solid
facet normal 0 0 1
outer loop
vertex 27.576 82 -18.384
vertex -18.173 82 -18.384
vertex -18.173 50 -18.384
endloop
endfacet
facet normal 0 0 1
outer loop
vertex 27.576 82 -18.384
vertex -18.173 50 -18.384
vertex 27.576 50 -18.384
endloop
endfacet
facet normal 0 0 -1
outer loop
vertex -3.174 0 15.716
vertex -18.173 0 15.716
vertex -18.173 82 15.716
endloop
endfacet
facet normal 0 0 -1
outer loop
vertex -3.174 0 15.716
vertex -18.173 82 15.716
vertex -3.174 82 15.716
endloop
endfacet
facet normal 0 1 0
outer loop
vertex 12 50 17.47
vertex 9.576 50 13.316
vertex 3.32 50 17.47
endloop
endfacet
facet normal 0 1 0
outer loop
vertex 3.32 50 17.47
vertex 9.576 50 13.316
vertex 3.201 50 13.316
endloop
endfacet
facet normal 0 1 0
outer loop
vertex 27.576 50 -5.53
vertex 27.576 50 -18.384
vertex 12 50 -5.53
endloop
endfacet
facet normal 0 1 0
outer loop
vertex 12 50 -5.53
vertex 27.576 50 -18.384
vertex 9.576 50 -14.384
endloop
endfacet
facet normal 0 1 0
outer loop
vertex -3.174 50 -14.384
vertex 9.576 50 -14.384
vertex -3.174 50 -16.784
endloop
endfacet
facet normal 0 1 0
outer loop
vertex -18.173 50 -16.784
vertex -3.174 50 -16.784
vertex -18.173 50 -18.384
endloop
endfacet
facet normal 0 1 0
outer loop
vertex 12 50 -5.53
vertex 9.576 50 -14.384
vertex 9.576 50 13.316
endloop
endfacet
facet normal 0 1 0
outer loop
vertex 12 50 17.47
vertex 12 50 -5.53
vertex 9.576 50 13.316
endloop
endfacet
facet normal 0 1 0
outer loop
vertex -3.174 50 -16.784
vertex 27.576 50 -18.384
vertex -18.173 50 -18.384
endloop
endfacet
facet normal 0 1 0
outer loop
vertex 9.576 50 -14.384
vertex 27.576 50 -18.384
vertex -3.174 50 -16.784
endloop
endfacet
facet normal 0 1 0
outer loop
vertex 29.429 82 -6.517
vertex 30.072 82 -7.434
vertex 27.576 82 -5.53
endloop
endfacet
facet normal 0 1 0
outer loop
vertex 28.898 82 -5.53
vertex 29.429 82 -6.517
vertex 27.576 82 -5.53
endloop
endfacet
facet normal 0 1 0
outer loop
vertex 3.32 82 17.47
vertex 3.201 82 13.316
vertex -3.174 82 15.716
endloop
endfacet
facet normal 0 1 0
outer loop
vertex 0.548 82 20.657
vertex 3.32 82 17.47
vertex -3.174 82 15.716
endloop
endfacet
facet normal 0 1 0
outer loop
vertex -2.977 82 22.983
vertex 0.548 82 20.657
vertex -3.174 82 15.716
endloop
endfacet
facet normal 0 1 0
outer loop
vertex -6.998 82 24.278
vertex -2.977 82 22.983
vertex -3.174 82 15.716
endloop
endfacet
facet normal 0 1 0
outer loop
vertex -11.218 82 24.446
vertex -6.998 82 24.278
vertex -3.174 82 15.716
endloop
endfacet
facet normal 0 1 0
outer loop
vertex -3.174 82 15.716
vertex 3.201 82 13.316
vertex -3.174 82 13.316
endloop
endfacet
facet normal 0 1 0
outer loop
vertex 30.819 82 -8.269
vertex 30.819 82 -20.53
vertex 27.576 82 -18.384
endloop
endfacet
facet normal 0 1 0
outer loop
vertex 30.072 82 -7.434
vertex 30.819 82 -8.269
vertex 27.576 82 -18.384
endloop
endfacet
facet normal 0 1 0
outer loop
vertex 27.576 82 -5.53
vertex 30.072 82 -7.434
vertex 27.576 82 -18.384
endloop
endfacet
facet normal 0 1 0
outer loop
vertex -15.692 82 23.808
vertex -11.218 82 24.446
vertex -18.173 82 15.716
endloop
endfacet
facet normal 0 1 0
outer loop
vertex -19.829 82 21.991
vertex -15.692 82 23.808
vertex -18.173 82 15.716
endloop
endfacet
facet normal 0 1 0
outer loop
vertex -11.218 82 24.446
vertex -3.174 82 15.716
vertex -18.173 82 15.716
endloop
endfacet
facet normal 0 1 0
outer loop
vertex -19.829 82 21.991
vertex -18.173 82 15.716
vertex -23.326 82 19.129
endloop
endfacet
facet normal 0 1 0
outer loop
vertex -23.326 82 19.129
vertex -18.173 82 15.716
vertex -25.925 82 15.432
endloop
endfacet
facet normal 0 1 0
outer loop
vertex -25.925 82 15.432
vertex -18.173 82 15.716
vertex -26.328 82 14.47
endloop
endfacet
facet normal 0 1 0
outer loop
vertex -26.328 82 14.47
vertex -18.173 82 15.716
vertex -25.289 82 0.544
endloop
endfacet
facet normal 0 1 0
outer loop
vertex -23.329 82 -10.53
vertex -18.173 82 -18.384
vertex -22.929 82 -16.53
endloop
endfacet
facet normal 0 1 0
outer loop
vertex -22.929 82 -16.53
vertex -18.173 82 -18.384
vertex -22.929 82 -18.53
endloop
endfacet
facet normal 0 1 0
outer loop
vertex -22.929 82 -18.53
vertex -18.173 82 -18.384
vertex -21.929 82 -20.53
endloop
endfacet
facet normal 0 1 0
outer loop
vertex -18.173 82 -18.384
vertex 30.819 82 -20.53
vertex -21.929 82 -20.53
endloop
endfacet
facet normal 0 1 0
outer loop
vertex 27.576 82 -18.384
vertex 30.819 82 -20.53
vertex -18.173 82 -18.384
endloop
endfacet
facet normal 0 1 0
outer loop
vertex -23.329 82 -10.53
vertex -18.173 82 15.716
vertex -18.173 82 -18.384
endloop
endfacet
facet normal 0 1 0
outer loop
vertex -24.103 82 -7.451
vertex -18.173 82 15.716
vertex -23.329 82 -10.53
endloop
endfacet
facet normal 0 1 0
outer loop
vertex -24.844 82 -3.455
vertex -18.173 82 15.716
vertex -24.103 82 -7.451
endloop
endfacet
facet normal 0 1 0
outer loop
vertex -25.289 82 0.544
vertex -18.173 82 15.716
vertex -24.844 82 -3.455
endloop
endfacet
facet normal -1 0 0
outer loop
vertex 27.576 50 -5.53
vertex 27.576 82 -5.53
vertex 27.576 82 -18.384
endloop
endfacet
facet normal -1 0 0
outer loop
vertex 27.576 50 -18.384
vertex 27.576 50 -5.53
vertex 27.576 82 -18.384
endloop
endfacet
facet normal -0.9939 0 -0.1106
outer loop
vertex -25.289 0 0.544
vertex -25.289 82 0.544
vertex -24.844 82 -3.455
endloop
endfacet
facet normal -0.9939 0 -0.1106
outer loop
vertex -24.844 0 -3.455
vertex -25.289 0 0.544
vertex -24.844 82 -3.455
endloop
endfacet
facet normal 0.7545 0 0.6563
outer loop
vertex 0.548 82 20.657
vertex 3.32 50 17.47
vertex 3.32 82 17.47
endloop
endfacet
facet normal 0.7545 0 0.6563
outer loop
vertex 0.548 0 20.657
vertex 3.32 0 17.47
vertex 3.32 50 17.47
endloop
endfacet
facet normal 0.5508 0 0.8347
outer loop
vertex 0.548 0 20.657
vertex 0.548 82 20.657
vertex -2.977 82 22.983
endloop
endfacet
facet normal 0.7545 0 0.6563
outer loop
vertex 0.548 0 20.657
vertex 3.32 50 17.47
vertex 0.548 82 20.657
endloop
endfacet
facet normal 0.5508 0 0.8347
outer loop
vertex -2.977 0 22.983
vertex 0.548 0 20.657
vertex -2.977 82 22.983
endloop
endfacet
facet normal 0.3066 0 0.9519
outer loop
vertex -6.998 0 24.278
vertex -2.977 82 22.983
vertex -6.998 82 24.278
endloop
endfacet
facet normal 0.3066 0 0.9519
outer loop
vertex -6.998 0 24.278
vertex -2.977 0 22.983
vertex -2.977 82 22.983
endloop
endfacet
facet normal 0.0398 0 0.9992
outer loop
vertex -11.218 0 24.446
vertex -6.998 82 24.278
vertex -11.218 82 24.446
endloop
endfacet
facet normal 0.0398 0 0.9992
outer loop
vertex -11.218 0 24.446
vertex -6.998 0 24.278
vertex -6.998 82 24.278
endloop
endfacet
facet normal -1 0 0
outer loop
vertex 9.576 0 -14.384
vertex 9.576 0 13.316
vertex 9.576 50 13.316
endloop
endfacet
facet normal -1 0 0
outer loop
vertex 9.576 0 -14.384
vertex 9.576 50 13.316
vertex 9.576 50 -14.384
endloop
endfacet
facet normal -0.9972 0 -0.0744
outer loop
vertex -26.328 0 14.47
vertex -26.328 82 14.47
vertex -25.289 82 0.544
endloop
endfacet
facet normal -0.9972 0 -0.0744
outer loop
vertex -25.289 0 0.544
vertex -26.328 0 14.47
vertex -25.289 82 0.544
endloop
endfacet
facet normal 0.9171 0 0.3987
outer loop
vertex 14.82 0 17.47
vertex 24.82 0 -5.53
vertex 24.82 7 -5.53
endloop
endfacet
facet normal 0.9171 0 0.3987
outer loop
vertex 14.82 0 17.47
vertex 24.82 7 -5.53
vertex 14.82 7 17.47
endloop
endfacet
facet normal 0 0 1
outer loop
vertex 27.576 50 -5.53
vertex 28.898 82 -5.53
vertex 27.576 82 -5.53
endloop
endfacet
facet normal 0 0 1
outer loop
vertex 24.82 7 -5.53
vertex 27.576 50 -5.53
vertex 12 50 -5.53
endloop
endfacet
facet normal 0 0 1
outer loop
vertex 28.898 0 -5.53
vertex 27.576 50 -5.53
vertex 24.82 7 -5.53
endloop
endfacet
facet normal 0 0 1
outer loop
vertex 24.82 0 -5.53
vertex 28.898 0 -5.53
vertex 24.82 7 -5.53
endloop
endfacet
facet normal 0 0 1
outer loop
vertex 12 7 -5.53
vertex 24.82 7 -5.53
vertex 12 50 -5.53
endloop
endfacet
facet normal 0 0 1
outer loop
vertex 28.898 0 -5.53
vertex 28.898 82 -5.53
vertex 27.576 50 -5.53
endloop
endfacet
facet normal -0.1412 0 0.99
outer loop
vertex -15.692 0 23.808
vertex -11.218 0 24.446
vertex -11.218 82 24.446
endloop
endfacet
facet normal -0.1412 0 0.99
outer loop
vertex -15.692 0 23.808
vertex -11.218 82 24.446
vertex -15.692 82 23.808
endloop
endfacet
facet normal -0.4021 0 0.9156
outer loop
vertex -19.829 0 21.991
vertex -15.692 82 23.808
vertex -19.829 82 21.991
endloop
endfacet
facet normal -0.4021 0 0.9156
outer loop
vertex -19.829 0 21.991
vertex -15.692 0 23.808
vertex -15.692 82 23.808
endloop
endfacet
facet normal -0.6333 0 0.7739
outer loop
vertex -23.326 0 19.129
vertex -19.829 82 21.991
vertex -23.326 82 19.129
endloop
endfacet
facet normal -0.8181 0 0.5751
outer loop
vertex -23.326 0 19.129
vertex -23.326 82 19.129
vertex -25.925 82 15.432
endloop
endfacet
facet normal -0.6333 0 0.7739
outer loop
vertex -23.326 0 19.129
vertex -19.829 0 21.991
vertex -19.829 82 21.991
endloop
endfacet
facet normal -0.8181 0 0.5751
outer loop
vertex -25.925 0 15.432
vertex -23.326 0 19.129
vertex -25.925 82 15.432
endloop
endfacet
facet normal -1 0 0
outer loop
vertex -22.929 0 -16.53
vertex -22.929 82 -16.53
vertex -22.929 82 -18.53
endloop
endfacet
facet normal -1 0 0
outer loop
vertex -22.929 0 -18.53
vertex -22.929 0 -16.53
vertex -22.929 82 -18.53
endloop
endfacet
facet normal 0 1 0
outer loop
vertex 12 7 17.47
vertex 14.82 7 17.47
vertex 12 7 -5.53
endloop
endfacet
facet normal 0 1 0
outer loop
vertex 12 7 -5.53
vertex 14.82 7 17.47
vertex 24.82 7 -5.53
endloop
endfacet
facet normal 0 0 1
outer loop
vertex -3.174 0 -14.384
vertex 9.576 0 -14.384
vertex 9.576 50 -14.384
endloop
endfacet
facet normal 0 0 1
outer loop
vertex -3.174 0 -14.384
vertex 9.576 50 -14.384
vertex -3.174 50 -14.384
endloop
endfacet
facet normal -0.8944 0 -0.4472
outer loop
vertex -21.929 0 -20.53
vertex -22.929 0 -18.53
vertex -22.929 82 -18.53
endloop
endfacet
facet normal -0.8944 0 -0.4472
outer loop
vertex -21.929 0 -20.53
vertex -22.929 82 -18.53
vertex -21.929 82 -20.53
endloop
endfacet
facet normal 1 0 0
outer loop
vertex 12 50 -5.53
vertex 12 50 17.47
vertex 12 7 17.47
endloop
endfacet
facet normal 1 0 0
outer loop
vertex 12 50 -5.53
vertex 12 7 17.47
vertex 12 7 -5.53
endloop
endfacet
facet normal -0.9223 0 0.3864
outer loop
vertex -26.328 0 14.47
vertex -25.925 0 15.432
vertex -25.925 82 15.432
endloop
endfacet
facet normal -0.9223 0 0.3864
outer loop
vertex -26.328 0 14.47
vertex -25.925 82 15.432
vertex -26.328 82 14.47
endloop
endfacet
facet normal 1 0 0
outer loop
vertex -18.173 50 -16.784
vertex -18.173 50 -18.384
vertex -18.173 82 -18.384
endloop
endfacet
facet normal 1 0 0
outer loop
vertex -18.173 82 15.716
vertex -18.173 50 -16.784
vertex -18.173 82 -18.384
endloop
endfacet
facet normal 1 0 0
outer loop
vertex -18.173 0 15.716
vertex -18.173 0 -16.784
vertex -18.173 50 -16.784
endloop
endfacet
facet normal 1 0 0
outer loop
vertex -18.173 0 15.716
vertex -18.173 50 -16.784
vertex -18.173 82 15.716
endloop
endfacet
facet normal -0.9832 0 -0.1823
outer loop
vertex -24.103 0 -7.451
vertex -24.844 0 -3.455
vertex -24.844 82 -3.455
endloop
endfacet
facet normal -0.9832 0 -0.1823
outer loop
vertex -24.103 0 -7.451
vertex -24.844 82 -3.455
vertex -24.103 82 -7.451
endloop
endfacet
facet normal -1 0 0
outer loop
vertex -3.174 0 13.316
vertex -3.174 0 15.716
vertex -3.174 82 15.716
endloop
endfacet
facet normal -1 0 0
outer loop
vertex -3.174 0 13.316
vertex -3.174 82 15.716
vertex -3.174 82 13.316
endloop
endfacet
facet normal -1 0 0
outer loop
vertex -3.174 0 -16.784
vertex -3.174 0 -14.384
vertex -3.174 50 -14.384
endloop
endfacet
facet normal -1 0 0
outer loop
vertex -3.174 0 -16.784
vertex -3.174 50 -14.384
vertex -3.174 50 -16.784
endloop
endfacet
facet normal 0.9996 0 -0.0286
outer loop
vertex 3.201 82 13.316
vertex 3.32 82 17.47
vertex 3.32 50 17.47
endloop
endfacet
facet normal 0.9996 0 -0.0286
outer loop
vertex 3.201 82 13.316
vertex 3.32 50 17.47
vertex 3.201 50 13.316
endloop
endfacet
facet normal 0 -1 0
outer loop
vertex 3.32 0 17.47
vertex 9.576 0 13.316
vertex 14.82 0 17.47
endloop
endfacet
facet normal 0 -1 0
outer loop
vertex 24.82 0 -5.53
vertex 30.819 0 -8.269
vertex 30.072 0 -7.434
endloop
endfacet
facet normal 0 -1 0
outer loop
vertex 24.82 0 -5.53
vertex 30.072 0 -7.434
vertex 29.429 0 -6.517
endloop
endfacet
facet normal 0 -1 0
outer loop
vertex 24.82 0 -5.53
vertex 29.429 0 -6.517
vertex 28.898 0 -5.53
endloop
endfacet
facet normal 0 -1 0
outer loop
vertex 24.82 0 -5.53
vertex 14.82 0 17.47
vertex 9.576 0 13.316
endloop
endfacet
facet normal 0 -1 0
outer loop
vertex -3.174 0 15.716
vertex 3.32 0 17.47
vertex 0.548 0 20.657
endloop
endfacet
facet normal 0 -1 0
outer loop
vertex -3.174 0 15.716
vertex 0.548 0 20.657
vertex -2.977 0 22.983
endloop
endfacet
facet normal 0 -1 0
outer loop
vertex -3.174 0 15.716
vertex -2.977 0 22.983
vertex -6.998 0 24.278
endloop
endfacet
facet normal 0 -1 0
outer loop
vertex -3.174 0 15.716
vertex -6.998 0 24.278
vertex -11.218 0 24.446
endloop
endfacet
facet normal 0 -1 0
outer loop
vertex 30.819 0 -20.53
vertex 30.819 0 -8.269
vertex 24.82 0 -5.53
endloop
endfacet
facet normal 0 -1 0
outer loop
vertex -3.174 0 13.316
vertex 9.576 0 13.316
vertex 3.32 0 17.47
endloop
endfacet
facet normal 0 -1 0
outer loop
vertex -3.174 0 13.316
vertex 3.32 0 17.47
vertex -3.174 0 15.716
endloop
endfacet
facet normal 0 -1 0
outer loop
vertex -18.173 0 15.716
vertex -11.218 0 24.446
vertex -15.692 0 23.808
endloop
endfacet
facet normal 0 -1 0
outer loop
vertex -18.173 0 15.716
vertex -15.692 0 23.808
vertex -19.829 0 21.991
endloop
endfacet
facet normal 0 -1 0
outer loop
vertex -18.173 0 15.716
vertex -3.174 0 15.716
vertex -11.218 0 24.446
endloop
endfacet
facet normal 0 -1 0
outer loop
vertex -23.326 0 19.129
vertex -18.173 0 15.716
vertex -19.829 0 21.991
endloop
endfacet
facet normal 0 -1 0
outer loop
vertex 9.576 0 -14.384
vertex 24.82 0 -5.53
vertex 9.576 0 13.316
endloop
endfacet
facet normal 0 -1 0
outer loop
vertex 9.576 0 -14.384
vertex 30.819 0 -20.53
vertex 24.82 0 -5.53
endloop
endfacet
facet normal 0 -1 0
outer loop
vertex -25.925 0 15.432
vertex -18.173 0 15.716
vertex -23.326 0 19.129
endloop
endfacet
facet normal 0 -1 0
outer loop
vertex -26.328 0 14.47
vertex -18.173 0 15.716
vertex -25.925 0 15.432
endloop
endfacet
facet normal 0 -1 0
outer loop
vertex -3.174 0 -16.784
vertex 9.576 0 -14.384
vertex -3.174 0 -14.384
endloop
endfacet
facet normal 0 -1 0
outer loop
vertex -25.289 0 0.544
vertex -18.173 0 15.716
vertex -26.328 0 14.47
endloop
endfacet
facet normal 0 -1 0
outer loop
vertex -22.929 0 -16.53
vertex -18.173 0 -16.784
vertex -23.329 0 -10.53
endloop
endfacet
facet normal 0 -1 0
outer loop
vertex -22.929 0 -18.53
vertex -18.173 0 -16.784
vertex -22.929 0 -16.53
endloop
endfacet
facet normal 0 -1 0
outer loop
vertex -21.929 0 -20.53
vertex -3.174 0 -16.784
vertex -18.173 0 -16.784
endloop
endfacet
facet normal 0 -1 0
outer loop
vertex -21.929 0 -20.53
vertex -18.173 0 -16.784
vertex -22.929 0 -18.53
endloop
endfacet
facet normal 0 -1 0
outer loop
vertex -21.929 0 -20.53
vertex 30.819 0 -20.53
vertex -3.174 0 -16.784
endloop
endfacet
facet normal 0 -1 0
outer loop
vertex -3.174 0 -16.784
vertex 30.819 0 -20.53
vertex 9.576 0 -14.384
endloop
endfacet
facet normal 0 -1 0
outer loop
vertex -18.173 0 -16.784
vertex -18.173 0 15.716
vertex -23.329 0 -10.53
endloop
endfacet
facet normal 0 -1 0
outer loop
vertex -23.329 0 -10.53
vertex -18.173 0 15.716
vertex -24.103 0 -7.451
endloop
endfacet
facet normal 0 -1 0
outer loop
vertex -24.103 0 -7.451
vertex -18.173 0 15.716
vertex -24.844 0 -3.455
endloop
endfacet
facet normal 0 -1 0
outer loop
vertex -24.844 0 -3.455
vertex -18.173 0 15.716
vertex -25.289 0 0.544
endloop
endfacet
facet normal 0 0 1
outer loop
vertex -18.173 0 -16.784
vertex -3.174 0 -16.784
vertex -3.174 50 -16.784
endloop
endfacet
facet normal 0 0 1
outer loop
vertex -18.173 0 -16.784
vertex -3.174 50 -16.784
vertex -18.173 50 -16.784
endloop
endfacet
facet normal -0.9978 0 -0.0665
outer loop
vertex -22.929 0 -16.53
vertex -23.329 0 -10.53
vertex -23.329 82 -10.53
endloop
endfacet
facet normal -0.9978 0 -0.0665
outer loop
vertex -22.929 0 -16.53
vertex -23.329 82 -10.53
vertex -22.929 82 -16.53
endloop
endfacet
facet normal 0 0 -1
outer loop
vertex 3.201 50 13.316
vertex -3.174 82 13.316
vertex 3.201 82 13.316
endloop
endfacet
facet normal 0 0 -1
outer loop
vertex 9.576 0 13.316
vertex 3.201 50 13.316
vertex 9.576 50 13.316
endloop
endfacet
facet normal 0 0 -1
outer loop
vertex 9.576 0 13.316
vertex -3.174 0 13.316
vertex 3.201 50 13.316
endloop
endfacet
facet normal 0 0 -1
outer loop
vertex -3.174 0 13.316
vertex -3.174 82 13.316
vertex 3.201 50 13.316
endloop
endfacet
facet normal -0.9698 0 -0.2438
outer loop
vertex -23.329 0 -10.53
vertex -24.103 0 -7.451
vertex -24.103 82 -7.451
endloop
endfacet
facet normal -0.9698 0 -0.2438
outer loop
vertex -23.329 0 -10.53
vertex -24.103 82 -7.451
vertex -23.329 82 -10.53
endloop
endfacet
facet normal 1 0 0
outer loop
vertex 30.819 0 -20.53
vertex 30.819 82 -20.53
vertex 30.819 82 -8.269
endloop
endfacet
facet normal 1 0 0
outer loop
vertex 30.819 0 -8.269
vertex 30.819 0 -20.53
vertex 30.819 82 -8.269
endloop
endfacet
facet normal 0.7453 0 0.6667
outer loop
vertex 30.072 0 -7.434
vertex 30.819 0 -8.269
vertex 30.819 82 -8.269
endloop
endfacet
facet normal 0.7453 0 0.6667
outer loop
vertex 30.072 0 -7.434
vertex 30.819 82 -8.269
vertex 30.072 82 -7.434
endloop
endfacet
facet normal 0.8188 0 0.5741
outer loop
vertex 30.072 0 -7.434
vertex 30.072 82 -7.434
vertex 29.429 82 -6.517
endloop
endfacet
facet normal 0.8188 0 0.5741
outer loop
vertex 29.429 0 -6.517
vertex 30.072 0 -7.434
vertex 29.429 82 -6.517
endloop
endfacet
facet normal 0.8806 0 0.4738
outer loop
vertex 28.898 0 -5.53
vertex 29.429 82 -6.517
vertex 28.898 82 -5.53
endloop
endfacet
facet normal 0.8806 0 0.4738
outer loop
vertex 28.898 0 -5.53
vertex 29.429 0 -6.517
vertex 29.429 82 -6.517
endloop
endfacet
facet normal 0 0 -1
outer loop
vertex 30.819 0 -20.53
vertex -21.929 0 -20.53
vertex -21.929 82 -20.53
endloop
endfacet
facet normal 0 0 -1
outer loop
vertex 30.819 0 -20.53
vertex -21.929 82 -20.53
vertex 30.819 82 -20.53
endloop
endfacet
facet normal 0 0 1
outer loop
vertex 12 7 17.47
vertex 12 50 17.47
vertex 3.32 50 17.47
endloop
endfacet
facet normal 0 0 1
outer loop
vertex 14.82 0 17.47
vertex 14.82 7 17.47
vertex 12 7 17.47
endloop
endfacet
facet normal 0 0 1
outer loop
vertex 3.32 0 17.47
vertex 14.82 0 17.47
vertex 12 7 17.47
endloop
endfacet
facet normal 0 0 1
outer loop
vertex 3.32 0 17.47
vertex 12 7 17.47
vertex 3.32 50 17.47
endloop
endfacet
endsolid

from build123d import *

# Parameters (mm, degrees)
BOSS_EXTRUDE1_DEPTH = 82
CUT_EXTRUDE1_DEPTH  = 105
SKETCH7_W           = 23
SKETCH7_H           = 43
CUT_EXTRUDE3_DEPTH  = 28
CUT_EXTRUDE4_DEPTH  = 32
CUT_EXTRUDE5_DEPTH  = 32
CUT_EXTRUDE6_DEPTH  = 32


with BuildPart() as part:
    # Sketch1 → Boss-Extrude1 (new body)
    with BuildSketch(Plane(origin=(0, 0, 0), x_dir=(1, 0, 0), z_dir=(0, 1, 0))):
        with BuildLine():
            Line((-21.9286378, 20.529965557), (30.819410356, 20.529965557))
            Line((30.819410356, 20.529965557), (30.819410356, 8.269460429))
            ThreePointArc((30.819410356, 8.269460429), (29.737157279, 6.984989328), (28.898083391, 5.52996605))
            Line((28.898083391, 5.52996605), (24.81959218, 5.52996605))
            Line((24.81959218, 5.52996605), (14.820019426, -17.47003395))
            Line((14.820019426, -17.47003395), (3.320446672, -17.47003395))
            ThreePointArc((3.320446672, -17.47003395), (-2.977277813, -22.983126936), (-11.218310652, -24.446310348))
            ThreePointArc((-11.218310652, -24.446310348), (-19.829053504, -21.990642561), (-25.924914656, -15.432009048))
            Line((-25.924914656, -15.432009048), (-26.328479109, -14.47003395))
            Line((-26.328479109, -14.47003395), (-25.288623152, -0.544399566))
            Line((-25.288623152, -0.544399566), (-24.844287214, 3.45451706))
            Line((-24.844287214, 3.45451706), (-24.102893172, 7.451406174))
            Line((-24.102893172, 7.451406174), (-23.328601179, 10.529965096))
            Line((-23.328601179, 10.529965096), (-22.928576765, 16.529967242))
            Line((-22.928576765, 16.529967242), (-22.928576765, 18.529964858))
            Line((-22.928576765, 18.529964858), (-21.9286378, 20.529965557))
        make_face()
    extrude(amount=BOSS_EXTRUDE1_DEPTH)

    # Sketch2 → Cut-Extrude1 (cut)
    with BuildSketch(Plane.XZ):
        Polygon((-18.173439963, -16.784486826), (-18.173439963, 15.715513413), (-3.173989279, 15.715513413), (-3.173989279, 13.315508549), (9.57552244, 13.315508549), (9.57552244, -14.3844853), (-3.173989279, -14.3844853), (-3.173989279, -16.784486826), align=None)
    extrude(amount=-CUT_EXTRUDE1_DEPTH, mode=Mode.SUBTRACT)

    # Sketch7 → Cut-Extrude3 (cut)
    with BuildSketch(Plane(origin=(40, 0, 0), x_dir=(0, 0, -1), z_dir=(1, 0, 0))):
        with Locations((-5.97003395, 28.5)):
            Rectangle(SKETCH7_W, SKETCH7_H)
    extrude(amount=-CUT_EXTRUDE3_DEPTH, mode=Mode.SUBTRACT)

    # Sketch9 → Cut-Extrude4 (cut)
    with BuildSketch(Plane(origin=(0, 82, 0), x_dir=(1, 0, 0), z_dir=(0, 1, 0))):
        Polygon((14.820019426, -17.47003395), (24.81959218, 5.52996605), (15.399238031, 5.52996605), align=None)
    extrude(amount=-CUT_EXTRUDE4_DEPTH, mode=Mode.SUBTRACT)

    # Sketch10 → Cut-Extrude5 (cut)
    with BuildSketch(Plane(origin=(0, 82, 0), x_dir=(1, 0, 0), z_dir=(0, 1, 0))):
        Polygon((3.320446672, -17.47003395), (3.20076658, -13.315508549), (9.57552244, -13.315508549), (9.57552244, 14.3844853), (9.57552244, 18.3844853), (27.57552244, 18.3844853), (27.57552244, 9.3844853), (27.57552244, 5.52996605), (15.399238031, 5.52996605), (14.820019426, -17.47003395), align=None)
    extrude(amount=-CUT_EXTRUDE5_DEPTH, mode=Mode.SUBTRACT)

    # Sketch12 → Cut-Extrude6 (cut)
    with BuildSketch(Plane(origin=(0, 82, 0), x_dir=(1, 0, 0), z_dir=(0, 1, 0))):
        Polygon((9.57552244, 14.3844853), (-3.173989279, 14.3844853), (-3.173989279, 16.784486826), (-18.173439963, 16.784486826), (-18.173439963, 18.3844853), (9.57552244, 18.3844853), align=None)
    extrude(amount=-CUT_EXTRUDE6_DEPTH, mode=Mode.SUBTRACT)


solid = part.part
